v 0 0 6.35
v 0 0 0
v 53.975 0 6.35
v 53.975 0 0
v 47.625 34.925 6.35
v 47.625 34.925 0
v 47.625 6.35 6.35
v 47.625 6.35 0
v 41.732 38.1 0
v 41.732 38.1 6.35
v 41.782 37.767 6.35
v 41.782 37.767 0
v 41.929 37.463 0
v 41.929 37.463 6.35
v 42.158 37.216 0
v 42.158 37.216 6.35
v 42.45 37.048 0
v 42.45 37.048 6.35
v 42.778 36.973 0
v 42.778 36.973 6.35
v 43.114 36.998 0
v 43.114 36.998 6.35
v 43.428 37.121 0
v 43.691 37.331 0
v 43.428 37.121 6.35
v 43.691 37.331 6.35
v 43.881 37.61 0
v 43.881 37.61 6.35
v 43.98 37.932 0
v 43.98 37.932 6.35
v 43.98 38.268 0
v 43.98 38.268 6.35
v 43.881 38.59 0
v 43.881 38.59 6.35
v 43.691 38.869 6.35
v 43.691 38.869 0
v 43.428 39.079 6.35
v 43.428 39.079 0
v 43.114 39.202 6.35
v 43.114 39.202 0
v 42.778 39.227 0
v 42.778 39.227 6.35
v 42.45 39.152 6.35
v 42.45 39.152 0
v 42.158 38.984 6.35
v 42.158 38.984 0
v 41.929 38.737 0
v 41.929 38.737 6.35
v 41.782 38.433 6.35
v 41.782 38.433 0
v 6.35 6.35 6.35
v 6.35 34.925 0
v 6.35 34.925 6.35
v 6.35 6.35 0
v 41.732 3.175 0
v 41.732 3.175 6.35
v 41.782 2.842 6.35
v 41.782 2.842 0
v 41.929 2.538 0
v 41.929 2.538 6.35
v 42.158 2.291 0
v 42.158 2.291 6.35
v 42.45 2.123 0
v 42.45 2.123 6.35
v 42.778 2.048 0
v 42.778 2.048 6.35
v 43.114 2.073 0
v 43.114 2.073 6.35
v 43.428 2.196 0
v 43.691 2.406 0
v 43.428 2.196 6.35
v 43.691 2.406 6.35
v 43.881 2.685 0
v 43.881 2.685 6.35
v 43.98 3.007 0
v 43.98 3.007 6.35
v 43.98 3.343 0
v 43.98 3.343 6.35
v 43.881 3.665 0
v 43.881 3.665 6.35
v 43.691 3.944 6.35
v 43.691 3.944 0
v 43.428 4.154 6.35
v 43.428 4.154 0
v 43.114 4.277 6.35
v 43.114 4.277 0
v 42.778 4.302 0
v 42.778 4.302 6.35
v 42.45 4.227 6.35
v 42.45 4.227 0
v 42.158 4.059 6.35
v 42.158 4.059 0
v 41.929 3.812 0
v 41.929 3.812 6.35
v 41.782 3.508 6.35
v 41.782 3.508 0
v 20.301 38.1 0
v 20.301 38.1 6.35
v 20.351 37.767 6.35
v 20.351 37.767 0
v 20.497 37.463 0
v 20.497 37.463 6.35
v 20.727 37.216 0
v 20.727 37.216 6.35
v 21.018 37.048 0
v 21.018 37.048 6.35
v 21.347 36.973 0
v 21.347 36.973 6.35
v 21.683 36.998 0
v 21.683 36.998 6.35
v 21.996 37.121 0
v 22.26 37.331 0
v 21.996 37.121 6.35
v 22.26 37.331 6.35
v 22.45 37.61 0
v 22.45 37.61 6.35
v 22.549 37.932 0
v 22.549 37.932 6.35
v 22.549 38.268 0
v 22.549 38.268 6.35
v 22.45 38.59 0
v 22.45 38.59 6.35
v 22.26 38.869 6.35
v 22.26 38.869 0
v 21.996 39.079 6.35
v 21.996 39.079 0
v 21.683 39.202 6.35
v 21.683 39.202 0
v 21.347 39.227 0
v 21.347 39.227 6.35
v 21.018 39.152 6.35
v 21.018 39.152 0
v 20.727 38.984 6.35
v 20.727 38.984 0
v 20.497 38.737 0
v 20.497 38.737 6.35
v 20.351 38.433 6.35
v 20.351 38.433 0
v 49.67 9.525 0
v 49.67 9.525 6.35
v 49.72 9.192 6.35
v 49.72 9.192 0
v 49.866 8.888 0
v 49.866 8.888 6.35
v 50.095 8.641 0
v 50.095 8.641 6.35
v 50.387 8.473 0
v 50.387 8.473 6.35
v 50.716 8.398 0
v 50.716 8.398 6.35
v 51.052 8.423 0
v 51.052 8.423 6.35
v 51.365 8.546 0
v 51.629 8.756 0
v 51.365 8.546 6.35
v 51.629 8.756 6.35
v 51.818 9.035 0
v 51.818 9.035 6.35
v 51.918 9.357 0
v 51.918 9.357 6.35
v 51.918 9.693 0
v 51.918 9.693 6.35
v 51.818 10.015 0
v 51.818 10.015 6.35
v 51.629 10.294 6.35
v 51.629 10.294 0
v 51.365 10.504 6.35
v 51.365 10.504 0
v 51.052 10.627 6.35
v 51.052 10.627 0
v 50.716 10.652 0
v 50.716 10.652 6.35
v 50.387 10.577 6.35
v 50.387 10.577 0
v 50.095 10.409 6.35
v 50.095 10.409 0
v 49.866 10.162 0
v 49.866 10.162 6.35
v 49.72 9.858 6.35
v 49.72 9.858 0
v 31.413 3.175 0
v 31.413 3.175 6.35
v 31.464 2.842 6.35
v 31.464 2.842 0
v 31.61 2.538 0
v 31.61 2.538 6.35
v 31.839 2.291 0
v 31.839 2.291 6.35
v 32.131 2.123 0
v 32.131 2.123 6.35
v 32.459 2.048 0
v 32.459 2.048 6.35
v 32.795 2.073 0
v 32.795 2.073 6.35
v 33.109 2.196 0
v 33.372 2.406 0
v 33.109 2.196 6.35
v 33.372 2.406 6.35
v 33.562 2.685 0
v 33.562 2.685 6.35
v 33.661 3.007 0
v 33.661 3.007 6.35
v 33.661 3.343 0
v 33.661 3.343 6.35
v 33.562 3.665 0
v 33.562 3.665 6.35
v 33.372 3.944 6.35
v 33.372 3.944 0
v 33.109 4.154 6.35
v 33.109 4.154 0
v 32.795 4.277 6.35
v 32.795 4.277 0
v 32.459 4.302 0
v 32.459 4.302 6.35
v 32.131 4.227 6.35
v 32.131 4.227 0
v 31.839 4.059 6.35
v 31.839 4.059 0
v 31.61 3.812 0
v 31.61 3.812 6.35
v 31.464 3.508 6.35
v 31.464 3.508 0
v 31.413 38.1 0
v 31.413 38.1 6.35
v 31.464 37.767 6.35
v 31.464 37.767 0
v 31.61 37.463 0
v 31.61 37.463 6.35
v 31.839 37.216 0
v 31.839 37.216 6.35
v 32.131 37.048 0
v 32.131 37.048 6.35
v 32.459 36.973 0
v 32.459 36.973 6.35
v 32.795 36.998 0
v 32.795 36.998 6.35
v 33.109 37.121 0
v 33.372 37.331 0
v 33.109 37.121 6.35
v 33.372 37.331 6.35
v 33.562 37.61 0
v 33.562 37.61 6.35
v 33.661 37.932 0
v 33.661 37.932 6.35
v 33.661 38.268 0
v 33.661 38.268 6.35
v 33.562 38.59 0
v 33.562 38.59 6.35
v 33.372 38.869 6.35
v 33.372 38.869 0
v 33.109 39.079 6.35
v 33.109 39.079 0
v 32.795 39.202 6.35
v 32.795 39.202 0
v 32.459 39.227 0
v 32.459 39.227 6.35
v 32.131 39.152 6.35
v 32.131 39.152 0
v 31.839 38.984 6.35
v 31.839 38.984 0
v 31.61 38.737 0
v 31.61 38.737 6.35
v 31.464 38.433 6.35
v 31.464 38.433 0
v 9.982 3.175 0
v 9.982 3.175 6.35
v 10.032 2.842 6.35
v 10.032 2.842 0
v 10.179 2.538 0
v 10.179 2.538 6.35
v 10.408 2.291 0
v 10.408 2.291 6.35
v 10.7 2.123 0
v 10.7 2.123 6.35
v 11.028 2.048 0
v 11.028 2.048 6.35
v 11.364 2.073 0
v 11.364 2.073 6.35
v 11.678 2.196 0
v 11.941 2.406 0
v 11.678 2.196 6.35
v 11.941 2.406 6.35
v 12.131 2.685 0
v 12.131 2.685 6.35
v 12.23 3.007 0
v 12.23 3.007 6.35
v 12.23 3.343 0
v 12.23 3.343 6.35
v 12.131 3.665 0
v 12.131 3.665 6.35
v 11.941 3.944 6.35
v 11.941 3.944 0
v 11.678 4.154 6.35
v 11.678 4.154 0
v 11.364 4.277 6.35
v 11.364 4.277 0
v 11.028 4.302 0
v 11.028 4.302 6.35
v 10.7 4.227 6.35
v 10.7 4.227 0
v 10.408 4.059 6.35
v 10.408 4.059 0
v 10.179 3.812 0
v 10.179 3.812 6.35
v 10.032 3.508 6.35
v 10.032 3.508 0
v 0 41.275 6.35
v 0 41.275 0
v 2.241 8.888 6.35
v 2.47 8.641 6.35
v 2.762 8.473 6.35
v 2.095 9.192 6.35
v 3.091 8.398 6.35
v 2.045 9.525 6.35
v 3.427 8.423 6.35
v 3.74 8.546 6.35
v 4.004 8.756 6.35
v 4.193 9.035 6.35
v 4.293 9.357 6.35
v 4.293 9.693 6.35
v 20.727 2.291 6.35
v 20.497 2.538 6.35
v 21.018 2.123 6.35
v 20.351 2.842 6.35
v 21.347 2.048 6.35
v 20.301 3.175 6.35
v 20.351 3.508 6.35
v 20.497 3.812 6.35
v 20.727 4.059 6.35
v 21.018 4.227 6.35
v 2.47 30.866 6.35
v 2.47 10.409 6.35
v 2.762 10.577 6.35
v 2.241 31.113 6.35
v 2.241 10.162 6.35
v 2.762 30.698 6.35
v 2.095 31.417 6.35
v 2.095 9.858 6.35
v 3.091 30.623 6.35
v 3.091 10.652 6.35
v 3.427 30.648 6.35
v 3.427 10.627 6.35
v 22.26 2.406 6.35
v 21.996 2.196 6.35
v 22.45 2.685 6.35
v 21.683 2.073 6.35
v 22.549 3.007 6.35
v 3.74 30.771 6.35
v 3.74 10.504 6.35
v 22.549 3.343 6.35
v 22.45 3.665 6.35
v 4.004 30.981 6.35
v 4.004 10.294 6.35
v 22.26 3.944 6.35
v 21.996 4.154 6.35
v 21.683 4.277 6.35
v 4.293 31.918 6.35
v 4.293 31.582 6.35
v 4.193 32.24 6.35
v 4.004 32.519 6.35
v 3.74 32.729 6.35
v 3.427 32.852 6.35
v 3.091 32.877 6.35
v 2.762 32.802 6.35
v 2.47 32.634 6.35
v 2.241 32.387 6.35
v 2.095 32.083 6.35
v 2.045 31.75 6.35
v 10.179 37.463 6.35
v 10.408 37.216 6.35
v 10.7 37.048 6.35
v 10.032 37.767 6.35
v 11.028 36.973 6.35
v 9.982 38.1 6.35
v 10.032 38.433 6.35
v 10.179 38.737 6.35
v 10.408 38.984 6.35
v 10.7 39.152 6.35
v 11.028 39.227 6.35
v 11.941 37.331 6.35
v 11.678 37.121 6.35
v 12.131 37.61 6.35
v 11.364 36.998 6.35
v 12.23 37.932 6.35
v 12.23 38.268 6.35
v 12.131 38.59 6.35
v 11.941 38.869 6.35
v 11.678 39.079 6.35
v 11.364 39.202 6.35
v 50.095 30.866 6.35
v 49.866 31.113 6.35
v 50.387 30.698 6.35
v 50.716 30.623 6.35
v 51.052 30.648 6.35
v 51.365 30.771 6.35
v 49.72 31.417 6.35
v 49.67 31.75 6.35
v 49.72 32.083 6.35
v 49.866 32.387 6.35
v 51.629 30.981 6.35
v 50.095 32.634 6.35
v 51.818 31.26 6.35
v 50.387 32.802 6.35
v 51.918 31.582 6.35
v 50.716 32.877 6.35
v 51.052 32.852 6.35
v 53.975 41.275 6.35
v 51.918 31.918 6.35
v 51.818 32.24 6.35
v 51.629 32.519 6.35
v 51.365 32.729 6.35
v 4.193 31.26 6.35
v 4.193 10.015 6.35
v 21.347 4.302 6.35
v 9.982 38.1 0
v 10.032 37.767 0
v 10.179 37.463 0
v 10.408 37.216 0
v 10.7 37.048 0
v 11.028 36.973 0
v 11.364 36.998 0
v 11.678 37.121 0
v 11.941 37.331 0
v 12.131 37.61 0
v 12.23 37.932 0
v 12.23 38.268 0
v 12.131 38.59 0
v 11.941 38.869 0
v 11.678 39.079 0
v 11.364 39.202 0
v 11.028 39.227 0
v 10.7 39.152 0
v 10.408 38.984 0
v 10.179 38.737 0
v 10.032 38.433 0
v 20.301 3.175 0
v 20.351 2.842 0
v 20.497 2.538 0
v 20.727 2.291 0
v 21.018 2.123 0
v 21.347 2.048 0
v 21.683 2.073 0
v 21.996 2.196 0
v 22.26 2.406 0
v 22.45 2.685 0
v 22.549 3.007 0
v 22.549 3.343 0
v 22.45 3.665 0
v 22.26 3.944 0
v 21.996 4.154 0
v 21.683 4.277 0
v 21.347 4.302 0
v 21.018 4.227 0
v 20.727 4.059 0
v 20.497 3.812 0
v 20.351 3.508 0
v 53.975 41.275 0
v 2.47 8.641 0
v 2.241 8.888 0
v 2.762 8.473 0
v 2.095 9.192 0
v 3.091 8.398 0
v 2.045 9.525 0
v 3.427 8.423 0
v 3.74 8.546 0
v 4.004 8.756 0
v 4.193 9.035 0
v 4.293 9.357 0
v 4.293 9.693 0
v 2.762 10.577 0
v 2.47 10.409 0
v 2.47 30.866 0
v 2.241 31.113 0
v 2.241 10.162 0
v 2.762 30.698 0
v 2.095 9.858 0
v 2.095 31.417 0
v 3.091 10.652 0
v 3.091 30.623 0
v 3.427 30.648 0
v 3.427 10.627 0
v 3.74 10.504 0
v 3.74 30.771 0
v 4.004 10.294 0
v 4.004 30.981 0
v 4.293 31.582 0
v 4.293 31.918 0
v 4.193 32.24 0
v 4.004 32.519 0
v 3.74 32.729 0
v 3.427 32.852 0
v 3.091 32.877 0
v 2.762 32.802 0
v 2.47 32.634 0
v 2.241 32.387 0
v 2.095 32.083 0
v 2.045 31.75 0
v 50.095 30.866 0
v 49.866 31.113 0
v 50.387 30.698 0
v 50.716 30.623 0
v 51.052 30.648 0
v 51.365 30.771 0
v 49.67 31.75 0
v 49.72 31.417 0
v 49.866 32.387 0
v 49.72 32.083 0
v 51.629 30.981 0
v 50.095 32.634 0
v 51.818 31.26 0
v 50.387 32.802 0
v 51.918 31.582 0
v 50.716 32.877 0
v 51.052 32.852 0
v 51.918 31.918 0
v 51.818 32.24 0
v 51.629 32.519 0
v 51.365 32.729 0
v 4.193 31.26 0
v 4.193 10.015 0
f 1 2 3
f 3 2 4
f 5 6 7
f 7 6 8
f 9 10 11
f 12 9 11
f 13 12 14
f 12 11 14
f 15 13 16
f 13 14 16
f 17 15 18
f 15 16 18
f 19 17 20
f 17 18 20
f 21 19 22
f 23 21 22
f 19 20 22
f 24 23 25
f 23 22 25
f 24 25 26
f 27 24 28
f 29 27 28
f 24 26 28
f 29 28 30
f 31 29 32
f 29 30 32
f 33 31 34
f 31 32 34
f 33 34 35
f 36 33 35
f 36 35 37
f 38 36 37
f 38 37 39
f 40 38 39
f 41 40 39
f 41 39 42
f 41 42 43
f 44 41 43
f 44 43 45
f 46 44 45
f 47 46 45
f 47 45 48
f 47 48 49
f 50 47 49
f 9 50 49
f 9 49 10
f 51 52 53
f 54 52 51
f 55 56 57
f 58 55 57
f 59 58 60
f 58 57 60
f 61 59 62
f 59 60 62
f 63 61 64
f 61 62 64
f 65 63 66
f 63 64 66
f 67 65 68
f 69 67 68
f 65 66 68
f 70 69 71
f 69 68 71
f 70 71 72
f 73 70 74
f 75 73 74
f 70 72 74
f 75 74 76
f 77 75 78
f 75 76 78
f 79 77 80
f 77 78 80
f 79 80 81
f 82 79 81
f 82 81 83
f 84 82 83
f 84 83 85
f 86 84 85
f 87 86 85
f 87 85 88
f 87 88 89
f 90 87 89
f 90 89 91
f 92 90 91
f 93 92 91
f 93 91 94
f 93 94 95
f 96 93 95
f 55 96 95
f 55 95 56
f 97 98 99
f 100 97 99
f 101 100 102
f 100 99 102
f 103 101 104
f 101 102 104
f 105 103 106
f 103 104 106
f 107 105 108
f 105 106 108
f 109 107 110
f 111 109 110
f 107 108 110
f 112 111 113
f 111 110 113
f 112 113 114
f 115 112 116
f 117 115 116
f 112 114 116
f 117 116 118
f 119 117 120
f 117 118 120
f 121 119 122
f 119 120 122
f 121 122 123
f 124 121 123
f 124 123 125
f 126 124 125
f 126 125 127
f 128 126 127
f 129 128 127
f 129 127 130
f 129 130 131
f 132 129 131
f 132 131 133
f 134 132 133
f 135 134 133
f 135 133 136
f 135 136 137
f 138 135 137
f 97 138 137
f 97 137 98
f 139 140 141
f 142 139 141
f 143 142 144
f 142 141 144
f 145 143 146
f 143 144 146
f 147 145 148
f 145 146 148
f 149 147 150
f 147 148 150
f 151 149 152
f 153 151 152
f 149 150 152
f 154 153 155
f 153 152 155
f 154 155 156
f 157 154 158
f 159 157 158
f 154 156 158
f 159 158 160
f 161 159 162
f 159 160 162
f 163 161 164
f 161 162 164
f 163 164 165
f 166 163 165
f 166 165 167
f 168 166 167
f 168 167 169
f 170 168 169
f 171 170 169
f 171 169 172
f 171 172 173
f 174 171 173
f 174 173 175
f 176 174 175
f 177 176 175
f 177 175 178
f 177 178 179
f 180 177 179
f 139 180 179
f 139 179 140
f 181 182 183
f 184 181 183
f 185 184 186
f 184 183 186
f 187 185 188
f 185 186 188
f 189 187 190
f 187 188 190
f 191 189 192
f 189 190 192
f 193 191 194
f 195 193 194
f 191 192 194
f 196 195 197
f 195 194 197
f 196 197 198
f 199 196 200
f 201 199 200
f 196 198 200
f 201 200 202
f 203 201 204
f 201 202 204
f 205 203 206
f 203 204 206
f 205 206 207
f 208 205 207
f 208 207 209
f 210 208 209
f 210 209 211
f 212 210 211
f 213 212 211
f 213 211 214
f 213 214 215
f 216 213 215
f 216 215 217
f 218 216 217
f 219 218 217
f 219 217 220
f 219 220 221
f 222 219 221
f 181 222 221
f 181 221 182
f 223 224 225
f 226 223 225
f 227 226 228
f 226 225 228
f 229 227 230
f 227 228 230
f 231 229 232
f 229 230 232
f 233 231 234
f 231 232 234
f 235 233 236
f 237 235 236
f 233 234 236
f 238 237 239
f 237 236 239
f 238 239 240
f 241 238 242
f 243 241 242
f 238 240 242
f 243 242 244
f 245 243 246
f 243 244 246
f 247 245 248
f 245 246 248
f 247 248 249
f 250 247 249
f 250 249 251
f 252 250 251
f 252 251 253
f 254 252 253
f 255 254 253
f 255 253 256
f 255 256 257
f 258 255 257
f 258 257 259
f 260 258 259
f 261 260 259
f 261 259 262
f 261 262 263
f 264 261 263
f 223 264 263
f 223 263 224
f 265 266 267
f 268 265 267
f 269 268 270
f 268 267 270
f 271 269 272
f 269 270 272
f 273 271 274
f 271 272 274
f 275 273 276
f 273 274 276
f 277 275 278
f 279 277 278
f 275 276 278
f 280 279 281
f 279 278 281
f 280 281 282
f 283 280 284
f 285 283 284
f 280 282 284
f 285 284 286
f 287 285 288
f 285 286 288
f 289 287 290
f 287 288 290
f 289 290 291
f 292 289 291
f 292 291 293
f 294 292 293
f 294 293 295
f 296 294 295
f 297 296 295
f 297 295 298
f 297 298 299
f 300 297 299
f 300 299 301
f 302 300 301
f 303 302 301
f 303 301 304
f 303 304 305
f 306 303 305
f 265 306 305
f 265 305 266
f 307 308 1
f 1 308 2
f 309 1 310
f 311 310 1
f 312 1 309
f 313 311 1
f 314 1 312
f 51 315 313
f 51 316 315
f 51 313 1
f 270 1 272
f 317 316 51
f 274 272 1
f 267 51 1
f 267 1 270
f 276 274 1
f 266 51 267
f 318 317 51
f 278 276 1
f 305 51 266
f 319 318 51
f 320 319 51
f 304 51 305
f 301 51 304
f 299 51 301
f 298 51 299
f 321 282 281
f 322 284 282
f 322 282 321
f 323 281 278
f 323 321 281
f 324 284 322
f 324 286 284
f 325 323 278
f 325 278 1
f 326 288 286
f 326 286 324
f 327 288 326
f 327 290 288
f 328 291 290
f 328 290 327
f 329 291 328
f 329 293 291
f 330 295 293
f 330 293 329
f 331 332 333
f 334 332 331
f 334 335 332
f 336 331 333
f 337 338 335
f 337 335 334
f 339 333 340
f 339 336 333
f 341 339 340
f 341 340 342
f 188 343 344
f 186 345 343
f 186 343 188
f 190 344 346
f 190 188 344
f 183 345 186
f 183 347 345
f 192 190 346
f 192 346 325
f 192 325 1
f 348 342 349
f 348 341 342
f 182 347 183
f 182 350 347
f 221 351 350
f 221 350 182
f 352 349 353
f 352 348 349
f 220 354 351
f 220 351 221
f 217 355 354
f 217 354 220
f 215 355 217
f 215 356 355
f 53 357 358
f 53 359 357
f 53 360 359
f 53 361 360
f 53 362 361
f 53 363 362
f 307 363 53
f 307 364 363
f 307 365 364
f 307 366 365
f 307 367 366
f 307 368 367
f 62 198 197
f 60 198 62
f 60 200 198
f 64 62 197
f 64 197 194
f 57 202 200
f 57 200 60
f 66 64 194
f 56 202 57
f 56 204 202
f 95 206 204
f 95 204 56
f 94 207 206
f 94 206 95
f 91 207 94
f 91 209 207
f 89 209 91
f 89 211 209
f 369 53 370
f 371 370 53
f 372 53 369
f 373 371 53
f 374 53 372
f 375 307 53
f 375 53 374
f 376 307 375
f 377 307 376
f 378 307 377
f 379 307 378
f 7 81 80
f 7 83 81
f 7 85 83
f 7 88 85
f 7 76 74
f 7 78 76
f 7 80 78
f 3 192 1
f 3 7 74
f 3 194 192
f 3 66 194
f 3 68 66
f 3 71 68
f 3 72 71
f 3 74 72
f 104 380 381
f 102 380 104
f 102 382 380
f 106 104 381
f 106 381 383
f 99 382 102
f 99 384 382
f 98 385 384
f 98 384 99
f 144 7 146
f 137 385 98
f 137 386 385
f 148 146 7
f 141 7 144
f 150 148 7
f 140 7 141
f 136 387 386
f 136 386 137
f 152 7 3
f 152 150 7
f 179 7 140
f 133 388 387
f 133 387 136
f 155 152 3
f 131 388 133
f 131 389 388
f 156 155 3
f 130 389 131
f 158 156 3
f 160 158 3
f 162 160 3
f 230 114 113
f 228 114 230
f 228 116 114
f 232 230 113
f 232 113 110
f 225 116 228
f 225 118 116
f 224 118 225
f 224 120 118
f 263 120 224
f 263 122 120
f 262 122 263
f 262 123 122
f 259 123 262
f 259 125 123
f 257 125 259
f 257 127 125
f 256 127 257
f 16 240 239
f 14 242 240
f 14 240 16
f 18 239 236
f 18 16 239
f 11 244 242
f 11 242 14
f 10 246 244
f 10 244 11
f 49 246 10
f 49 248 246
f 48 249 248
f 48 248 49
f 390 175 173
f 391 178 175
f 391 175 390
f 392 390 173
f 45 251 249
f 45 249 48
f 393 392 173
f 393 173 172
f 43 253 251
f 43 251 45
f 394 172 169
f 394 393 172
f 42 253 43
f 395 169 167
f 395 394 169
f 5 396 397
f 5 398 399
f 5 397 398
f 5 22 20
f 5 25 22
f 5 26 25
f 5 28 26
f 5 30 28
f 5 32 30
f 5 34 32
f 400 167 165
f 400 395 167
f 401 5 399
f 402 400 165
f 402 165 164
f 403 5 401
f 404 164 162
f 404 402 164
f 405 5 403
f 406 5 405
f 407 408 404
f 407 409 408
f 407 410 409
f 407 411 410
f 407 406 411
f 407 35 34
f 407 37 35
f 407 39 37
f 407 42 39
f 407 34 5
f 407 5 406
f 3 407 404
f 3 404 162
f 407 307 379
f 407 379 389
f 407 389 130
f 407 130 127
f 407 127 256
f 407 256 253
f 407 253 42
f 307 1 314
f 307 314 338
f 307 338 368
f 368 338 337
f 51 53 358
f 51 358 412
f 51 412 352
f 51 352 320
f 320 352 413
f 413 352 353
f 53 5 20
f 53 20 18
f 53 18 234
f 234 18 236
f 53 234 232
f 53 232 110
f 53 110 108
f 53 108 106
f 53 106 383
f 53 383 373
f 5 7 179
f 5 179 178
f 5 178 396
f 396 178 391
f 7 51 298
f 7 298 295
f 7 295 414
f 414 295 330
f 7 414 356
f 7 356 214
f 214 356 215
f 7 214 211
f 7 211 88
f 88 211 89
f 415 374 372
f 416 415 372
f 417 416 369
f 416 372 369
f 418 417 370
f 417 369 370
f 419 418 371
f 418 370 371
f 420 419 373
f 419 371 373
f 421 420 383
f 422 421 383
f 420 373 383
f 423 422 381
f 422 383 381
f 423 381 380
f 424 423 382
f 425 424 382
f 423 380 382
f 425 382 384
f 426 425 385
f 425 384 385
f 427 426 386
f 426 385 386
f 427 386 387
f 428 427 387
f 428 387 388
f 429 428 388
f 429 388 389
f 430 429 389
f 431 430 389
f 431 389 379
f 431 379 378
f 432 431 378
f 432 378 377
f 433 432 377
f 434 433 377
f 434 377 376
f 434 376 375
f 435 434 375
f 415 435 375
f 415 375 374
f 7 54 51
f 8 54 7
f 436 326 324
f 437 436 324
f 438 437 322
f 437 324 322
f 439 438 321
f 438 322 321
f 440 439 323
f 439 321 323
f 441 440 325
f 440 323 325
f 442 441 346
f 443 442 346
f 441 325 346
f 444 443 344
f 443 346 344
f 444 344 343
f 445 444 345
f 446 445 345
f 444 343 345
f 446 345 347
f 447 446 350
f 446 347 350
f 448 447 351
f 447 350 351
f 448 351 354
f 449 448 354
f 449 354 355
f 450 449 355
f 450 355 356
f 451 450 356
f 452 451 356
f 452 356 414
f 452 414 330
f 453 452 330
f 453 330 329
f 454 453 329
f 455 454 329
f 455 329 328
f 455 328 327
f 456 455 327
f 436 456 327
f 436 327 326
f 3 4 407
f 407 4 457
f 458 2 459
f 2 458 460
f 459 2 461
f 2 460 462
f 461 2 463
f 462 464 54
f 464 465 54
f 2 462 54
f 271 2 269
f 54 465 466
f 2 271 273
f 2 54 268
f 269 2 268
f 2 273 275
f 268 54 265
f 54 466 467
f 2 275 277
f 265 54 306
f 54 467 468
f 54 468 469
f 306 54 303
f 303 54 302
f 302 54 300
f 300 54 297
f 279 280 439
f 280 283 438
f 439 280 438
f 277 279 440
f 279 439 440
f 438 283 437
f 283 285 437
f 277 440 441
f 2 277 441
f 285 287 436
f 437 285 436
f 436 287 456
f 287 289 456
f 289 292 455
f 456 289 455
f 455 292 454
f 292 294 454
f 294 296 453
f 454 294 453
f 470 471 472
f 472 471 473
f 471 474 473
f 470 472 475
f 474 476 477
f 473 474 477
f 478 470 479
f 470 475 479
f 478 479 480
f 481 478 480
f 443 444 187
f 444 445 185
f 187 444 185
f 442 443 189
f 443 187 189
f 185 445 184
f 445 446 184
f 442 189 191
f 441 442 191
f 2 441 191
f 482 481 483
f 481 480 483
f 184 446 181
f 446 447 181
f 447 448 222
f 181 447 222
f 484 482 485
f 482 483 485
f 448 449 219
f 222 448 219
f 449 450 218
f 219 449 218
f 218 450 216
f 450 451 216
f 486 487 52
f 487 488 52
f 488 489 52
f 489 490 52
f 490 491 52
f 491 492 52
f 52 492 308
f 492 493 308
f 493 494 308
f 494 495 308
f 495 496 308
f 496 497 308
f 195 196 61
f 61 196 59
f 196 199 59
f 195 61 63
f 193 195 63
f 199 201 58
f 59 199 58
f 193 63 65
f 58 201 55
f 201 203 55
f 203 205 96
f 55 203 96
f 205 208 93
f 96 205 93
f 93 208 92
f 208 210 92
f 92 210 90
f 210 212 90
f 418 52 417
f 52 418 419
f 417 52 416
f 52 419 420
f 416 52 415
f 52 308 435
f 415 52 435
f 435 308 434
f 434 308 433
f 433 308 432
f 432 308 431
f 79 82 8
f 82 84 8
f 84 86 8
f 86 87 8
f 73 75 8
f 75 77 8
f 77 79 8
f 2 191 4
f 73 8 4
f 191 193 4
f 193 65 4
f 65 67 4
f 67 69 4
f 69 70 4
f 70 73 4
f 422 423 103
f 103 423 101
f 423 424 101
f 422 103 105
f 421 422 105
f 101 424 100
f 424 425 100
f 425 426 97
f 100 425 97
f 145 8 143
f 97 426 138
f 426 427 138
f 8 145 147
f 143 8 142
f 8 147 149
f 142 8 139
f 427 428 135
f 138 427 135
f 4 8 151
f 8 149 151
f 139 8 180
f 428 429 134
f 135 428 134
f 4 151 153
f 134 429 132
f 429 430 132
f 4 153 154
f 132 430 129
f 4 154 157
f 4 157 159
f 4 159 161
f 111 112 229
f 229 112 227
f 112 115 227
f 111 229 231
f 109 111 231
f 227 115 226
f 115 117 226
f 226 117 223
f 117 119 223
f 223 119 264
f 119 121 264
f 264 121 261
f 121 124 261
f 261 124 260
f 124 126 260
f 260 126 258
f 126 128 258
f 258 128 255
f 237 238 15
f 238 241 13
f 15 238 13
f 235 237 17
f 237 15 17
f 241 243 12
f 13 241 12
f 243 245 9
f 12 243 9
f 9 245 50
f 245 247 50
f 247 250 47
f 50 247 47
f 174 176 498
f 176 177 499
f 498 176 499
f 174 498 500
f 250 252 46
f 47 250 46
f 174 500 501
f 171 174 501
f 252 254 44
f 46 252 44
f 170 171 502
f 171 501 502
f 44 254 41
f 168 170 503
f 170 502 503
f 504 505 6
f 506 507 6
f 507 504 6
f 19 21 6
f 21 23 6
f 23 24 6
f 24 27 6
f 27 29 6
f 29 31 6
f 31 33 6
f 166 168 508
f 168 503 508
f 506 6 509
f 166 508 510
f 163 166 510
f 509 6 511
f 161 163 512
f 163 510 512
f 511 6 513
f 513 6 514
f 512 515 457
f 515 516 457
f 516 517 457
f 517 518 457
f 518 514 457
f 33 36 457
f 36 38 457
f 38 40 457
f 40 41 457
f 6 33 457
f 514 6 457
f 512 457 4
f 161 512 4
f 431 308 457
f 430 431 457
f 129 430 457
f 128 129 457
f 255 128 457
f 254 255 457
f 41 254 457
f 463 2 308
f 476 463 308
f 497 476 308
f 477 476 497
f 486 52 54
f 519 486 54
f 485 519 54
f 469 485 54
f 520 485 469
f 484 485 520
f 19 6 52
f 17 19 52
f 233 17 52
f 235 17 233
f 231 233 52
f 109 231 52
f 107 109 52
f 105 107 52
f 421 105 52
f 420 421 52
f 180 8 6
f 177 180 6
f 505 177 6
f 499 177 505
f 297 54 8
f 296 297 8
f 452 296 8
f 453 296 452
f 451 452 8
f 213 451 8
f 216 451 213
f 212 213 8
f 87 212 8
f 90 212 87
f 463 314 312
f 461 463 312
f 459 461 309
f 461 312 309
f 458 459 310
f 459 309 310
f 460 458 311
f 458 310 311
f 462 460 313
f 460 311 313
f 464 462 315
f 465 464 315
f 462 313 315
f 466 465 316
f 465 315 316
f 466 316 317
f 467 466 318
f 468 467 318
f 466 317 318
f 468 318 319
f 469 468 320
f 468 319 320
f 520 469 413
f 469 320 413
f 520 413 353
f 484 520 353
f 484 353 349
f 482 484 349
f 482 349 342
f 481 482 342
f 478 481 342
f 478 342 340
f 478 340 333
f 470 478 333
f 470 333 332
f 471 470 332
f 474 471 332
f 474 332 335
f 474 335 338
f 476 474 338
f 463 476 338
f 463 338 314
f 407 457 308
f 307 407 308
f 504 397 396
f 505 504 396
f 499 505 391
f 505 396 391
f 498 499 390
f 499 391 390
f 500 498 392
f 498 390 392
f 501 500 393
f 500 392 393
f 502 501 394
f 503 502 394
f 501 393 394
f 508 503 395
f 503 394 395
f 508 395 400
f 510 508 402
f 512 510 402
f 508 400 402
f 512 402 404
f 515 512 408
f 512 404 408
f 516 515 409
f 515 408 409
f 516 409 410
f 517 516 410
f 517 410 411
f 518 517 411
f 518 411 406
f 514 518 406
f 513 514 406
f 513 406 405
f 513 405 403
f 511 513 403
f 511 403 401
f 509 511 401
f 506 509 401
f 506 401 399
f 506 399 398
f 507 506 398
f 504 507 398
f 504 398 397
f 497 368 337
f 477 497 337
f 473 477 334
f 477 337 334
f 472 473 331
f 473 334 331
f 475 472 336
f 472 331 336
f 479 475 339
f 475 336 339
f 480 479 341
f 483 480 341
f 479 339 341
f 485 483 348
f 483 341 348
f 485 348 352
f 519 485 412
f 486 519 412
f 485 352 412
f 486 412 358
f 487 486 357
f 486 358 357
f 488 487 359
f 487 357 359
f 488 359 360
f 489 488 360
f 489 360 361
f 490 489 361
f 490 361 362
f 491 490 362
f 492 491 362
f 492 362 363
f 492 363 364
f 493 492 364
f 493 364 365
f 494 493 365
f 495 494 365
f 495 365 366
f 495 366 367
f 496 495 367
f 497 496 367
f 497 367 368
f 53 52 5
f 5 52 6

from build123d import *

# Parameters (mm, degrees)
F0_W     = 3.175
F0_H     = 3.175
F1_DEPTH = 6.35
F2_W     = 41.275
F2_H     = 28.575
F3_DEPTH = 6.35
F4_D     = 2.2606
F5_D     = 2.2606
F6_D     = 2.2606
F7_D     = 2.2606
F8_D     = 2.2606
F9_D     = 2.2606
F10_D    = 2.2606
F11_D    = 2.2606
F12_D    = 2.2606
F13_D    = 2.2606
F14_D    = 2.2606
F15_D    = 2.2606


with BuildPart() as f1:
    # F0 (on Top) → F1 (new body)
    with BuildSketch(Plane.XY):
        with Locations((1.5875, 1.5875)):
            Rectangle(F0_W, F0_H)
        Polygon((3.175, 3.175), (3.175, 0), (50.8, 0), (50.8, 3.175), (53.975, 3.175), (53.975, 38.1), (50.8, 38.1), (50.8, 41.275), (3.175, 41.275), (3.175, 38.1), (0, 38.1), (0, 3.175), align=None)
        with Locations((52.3875, 1.5875)):
            Rectangle(F0_W, F0_H)
        with Locations((1.5875, 39.6875)):
            Rectangle(F0_W, F0_H)
        with Locations((52.3875, 39.6875)):
            Rectangle(F0_W, F0_H)
    extrude(amount=F1_DEPTH)

    # F2 (on face) → F3 (cut, through all)
    with BuildSketch(Plane(origin=(0, 0, 0), x_dir=(1, 0, 0), z_dir=(0, 0, -1))):
        with Locations((26.9875, -20.6375)):
            Rectangle(F2_W, F2_H)
    extrude(amount=-F3_DEPTH, mode=Mode.SUBTRACT)

    # F4 (through all)
    with Locations(Plane(origin=(0, 0, 0), x_dir=(1, 0, 0), z_dir=(0, 0, -1))):
        with Locations((11.1125, -3.175)):
            Hole(F4_D / 2)

    # F5 (through all)
    with Locations(Plane(origin=(0, 0, 0), x_dir=(1, 0, 0), z_dir=(0, 0, -1))):
        with Locations((21.43125, -3.175)):
            Hole(F5_D / 2)

    # F6 (through all)
    with Locations(Plane(origin=(0, 0, 0), x_dir=(1, 0, 0), z_dir=(0, 0, -1))):
        with Locations((32.54375, -3.175)):
            Hole(F6_D / 2)

    # F7 (through all)
    with Locations(Plane(origin=(0, 0, 0), x_dir=(1, 0, 0), z_dir=(0, 0, -1))):
        with Locations((42.8625, -3.175)):
            Hole(F7_D / 2)

    # F8 (through all)
    with Locations(Plane(origin=(0, 0, 0), x_dir=(1, 0, 0), z_dir=(0, 0, -1))):
        with Locations((11.1125, -38.1)):
            Hole(F8_D / 2)

    # F9 (through all)
    with Locations(Plane(origin=(0, 0, 0), x_dir=(1, 0, 0), z_dir=(0, 0, -1))):
        with Locations((21.43125, -38.1)):
            Hole(F9_D / 2)

    # F10 (through all)
    with Locations(Plane(origin=(0, 0, 0), x_dir=(1, 0, 0), z_dir=(0, 0, -1))):
        with Locations((32.54375, -38.1)):
            Hole(F10_D / 2)

    # F11 (through all)
    with Locations(Plane(origin=(0, 0, 0), x_dir=(1, 0, 0), z_dir=(0, 0, -1))):
        with Locations((42.8625, -38.1)):
            Hole(F11_D / 2)

    # F12 (through all)
    with Locations(Plane(origin=(0, 0, 0), x_dir=(1, 0, 0), z_dir=(0, 0, -1))):
        with Locations((3.175, -9.525)):
            Hole(F12_D / 2)

    # F13 (through all)
    with Locations(Plane(origin=(0, 0, 0), x_dir=(1, 0, 0), z_dir=(0, 0, -1))):
        with Locations((3.175, -31.75)):
            Hole(F13_D / 2)

    # F14 (through all)
    with Locations(Plane(origin=(0, 0, 0), x_dir=(1, 0, 0), z_dir=(0, 0, -1))):
        with Locations((50.8, -9.525)):
            Hole(F14_D / 2)

    # F15 (through all)
    with Locations(Plane(origin=(0, 0, 0), x_dir=(1, 0, 0), z_dir=(0, 0, -1))):
        with Locations((50.8, -31.75)):
            Hole(F15_D / 2)


solid = f1.part
